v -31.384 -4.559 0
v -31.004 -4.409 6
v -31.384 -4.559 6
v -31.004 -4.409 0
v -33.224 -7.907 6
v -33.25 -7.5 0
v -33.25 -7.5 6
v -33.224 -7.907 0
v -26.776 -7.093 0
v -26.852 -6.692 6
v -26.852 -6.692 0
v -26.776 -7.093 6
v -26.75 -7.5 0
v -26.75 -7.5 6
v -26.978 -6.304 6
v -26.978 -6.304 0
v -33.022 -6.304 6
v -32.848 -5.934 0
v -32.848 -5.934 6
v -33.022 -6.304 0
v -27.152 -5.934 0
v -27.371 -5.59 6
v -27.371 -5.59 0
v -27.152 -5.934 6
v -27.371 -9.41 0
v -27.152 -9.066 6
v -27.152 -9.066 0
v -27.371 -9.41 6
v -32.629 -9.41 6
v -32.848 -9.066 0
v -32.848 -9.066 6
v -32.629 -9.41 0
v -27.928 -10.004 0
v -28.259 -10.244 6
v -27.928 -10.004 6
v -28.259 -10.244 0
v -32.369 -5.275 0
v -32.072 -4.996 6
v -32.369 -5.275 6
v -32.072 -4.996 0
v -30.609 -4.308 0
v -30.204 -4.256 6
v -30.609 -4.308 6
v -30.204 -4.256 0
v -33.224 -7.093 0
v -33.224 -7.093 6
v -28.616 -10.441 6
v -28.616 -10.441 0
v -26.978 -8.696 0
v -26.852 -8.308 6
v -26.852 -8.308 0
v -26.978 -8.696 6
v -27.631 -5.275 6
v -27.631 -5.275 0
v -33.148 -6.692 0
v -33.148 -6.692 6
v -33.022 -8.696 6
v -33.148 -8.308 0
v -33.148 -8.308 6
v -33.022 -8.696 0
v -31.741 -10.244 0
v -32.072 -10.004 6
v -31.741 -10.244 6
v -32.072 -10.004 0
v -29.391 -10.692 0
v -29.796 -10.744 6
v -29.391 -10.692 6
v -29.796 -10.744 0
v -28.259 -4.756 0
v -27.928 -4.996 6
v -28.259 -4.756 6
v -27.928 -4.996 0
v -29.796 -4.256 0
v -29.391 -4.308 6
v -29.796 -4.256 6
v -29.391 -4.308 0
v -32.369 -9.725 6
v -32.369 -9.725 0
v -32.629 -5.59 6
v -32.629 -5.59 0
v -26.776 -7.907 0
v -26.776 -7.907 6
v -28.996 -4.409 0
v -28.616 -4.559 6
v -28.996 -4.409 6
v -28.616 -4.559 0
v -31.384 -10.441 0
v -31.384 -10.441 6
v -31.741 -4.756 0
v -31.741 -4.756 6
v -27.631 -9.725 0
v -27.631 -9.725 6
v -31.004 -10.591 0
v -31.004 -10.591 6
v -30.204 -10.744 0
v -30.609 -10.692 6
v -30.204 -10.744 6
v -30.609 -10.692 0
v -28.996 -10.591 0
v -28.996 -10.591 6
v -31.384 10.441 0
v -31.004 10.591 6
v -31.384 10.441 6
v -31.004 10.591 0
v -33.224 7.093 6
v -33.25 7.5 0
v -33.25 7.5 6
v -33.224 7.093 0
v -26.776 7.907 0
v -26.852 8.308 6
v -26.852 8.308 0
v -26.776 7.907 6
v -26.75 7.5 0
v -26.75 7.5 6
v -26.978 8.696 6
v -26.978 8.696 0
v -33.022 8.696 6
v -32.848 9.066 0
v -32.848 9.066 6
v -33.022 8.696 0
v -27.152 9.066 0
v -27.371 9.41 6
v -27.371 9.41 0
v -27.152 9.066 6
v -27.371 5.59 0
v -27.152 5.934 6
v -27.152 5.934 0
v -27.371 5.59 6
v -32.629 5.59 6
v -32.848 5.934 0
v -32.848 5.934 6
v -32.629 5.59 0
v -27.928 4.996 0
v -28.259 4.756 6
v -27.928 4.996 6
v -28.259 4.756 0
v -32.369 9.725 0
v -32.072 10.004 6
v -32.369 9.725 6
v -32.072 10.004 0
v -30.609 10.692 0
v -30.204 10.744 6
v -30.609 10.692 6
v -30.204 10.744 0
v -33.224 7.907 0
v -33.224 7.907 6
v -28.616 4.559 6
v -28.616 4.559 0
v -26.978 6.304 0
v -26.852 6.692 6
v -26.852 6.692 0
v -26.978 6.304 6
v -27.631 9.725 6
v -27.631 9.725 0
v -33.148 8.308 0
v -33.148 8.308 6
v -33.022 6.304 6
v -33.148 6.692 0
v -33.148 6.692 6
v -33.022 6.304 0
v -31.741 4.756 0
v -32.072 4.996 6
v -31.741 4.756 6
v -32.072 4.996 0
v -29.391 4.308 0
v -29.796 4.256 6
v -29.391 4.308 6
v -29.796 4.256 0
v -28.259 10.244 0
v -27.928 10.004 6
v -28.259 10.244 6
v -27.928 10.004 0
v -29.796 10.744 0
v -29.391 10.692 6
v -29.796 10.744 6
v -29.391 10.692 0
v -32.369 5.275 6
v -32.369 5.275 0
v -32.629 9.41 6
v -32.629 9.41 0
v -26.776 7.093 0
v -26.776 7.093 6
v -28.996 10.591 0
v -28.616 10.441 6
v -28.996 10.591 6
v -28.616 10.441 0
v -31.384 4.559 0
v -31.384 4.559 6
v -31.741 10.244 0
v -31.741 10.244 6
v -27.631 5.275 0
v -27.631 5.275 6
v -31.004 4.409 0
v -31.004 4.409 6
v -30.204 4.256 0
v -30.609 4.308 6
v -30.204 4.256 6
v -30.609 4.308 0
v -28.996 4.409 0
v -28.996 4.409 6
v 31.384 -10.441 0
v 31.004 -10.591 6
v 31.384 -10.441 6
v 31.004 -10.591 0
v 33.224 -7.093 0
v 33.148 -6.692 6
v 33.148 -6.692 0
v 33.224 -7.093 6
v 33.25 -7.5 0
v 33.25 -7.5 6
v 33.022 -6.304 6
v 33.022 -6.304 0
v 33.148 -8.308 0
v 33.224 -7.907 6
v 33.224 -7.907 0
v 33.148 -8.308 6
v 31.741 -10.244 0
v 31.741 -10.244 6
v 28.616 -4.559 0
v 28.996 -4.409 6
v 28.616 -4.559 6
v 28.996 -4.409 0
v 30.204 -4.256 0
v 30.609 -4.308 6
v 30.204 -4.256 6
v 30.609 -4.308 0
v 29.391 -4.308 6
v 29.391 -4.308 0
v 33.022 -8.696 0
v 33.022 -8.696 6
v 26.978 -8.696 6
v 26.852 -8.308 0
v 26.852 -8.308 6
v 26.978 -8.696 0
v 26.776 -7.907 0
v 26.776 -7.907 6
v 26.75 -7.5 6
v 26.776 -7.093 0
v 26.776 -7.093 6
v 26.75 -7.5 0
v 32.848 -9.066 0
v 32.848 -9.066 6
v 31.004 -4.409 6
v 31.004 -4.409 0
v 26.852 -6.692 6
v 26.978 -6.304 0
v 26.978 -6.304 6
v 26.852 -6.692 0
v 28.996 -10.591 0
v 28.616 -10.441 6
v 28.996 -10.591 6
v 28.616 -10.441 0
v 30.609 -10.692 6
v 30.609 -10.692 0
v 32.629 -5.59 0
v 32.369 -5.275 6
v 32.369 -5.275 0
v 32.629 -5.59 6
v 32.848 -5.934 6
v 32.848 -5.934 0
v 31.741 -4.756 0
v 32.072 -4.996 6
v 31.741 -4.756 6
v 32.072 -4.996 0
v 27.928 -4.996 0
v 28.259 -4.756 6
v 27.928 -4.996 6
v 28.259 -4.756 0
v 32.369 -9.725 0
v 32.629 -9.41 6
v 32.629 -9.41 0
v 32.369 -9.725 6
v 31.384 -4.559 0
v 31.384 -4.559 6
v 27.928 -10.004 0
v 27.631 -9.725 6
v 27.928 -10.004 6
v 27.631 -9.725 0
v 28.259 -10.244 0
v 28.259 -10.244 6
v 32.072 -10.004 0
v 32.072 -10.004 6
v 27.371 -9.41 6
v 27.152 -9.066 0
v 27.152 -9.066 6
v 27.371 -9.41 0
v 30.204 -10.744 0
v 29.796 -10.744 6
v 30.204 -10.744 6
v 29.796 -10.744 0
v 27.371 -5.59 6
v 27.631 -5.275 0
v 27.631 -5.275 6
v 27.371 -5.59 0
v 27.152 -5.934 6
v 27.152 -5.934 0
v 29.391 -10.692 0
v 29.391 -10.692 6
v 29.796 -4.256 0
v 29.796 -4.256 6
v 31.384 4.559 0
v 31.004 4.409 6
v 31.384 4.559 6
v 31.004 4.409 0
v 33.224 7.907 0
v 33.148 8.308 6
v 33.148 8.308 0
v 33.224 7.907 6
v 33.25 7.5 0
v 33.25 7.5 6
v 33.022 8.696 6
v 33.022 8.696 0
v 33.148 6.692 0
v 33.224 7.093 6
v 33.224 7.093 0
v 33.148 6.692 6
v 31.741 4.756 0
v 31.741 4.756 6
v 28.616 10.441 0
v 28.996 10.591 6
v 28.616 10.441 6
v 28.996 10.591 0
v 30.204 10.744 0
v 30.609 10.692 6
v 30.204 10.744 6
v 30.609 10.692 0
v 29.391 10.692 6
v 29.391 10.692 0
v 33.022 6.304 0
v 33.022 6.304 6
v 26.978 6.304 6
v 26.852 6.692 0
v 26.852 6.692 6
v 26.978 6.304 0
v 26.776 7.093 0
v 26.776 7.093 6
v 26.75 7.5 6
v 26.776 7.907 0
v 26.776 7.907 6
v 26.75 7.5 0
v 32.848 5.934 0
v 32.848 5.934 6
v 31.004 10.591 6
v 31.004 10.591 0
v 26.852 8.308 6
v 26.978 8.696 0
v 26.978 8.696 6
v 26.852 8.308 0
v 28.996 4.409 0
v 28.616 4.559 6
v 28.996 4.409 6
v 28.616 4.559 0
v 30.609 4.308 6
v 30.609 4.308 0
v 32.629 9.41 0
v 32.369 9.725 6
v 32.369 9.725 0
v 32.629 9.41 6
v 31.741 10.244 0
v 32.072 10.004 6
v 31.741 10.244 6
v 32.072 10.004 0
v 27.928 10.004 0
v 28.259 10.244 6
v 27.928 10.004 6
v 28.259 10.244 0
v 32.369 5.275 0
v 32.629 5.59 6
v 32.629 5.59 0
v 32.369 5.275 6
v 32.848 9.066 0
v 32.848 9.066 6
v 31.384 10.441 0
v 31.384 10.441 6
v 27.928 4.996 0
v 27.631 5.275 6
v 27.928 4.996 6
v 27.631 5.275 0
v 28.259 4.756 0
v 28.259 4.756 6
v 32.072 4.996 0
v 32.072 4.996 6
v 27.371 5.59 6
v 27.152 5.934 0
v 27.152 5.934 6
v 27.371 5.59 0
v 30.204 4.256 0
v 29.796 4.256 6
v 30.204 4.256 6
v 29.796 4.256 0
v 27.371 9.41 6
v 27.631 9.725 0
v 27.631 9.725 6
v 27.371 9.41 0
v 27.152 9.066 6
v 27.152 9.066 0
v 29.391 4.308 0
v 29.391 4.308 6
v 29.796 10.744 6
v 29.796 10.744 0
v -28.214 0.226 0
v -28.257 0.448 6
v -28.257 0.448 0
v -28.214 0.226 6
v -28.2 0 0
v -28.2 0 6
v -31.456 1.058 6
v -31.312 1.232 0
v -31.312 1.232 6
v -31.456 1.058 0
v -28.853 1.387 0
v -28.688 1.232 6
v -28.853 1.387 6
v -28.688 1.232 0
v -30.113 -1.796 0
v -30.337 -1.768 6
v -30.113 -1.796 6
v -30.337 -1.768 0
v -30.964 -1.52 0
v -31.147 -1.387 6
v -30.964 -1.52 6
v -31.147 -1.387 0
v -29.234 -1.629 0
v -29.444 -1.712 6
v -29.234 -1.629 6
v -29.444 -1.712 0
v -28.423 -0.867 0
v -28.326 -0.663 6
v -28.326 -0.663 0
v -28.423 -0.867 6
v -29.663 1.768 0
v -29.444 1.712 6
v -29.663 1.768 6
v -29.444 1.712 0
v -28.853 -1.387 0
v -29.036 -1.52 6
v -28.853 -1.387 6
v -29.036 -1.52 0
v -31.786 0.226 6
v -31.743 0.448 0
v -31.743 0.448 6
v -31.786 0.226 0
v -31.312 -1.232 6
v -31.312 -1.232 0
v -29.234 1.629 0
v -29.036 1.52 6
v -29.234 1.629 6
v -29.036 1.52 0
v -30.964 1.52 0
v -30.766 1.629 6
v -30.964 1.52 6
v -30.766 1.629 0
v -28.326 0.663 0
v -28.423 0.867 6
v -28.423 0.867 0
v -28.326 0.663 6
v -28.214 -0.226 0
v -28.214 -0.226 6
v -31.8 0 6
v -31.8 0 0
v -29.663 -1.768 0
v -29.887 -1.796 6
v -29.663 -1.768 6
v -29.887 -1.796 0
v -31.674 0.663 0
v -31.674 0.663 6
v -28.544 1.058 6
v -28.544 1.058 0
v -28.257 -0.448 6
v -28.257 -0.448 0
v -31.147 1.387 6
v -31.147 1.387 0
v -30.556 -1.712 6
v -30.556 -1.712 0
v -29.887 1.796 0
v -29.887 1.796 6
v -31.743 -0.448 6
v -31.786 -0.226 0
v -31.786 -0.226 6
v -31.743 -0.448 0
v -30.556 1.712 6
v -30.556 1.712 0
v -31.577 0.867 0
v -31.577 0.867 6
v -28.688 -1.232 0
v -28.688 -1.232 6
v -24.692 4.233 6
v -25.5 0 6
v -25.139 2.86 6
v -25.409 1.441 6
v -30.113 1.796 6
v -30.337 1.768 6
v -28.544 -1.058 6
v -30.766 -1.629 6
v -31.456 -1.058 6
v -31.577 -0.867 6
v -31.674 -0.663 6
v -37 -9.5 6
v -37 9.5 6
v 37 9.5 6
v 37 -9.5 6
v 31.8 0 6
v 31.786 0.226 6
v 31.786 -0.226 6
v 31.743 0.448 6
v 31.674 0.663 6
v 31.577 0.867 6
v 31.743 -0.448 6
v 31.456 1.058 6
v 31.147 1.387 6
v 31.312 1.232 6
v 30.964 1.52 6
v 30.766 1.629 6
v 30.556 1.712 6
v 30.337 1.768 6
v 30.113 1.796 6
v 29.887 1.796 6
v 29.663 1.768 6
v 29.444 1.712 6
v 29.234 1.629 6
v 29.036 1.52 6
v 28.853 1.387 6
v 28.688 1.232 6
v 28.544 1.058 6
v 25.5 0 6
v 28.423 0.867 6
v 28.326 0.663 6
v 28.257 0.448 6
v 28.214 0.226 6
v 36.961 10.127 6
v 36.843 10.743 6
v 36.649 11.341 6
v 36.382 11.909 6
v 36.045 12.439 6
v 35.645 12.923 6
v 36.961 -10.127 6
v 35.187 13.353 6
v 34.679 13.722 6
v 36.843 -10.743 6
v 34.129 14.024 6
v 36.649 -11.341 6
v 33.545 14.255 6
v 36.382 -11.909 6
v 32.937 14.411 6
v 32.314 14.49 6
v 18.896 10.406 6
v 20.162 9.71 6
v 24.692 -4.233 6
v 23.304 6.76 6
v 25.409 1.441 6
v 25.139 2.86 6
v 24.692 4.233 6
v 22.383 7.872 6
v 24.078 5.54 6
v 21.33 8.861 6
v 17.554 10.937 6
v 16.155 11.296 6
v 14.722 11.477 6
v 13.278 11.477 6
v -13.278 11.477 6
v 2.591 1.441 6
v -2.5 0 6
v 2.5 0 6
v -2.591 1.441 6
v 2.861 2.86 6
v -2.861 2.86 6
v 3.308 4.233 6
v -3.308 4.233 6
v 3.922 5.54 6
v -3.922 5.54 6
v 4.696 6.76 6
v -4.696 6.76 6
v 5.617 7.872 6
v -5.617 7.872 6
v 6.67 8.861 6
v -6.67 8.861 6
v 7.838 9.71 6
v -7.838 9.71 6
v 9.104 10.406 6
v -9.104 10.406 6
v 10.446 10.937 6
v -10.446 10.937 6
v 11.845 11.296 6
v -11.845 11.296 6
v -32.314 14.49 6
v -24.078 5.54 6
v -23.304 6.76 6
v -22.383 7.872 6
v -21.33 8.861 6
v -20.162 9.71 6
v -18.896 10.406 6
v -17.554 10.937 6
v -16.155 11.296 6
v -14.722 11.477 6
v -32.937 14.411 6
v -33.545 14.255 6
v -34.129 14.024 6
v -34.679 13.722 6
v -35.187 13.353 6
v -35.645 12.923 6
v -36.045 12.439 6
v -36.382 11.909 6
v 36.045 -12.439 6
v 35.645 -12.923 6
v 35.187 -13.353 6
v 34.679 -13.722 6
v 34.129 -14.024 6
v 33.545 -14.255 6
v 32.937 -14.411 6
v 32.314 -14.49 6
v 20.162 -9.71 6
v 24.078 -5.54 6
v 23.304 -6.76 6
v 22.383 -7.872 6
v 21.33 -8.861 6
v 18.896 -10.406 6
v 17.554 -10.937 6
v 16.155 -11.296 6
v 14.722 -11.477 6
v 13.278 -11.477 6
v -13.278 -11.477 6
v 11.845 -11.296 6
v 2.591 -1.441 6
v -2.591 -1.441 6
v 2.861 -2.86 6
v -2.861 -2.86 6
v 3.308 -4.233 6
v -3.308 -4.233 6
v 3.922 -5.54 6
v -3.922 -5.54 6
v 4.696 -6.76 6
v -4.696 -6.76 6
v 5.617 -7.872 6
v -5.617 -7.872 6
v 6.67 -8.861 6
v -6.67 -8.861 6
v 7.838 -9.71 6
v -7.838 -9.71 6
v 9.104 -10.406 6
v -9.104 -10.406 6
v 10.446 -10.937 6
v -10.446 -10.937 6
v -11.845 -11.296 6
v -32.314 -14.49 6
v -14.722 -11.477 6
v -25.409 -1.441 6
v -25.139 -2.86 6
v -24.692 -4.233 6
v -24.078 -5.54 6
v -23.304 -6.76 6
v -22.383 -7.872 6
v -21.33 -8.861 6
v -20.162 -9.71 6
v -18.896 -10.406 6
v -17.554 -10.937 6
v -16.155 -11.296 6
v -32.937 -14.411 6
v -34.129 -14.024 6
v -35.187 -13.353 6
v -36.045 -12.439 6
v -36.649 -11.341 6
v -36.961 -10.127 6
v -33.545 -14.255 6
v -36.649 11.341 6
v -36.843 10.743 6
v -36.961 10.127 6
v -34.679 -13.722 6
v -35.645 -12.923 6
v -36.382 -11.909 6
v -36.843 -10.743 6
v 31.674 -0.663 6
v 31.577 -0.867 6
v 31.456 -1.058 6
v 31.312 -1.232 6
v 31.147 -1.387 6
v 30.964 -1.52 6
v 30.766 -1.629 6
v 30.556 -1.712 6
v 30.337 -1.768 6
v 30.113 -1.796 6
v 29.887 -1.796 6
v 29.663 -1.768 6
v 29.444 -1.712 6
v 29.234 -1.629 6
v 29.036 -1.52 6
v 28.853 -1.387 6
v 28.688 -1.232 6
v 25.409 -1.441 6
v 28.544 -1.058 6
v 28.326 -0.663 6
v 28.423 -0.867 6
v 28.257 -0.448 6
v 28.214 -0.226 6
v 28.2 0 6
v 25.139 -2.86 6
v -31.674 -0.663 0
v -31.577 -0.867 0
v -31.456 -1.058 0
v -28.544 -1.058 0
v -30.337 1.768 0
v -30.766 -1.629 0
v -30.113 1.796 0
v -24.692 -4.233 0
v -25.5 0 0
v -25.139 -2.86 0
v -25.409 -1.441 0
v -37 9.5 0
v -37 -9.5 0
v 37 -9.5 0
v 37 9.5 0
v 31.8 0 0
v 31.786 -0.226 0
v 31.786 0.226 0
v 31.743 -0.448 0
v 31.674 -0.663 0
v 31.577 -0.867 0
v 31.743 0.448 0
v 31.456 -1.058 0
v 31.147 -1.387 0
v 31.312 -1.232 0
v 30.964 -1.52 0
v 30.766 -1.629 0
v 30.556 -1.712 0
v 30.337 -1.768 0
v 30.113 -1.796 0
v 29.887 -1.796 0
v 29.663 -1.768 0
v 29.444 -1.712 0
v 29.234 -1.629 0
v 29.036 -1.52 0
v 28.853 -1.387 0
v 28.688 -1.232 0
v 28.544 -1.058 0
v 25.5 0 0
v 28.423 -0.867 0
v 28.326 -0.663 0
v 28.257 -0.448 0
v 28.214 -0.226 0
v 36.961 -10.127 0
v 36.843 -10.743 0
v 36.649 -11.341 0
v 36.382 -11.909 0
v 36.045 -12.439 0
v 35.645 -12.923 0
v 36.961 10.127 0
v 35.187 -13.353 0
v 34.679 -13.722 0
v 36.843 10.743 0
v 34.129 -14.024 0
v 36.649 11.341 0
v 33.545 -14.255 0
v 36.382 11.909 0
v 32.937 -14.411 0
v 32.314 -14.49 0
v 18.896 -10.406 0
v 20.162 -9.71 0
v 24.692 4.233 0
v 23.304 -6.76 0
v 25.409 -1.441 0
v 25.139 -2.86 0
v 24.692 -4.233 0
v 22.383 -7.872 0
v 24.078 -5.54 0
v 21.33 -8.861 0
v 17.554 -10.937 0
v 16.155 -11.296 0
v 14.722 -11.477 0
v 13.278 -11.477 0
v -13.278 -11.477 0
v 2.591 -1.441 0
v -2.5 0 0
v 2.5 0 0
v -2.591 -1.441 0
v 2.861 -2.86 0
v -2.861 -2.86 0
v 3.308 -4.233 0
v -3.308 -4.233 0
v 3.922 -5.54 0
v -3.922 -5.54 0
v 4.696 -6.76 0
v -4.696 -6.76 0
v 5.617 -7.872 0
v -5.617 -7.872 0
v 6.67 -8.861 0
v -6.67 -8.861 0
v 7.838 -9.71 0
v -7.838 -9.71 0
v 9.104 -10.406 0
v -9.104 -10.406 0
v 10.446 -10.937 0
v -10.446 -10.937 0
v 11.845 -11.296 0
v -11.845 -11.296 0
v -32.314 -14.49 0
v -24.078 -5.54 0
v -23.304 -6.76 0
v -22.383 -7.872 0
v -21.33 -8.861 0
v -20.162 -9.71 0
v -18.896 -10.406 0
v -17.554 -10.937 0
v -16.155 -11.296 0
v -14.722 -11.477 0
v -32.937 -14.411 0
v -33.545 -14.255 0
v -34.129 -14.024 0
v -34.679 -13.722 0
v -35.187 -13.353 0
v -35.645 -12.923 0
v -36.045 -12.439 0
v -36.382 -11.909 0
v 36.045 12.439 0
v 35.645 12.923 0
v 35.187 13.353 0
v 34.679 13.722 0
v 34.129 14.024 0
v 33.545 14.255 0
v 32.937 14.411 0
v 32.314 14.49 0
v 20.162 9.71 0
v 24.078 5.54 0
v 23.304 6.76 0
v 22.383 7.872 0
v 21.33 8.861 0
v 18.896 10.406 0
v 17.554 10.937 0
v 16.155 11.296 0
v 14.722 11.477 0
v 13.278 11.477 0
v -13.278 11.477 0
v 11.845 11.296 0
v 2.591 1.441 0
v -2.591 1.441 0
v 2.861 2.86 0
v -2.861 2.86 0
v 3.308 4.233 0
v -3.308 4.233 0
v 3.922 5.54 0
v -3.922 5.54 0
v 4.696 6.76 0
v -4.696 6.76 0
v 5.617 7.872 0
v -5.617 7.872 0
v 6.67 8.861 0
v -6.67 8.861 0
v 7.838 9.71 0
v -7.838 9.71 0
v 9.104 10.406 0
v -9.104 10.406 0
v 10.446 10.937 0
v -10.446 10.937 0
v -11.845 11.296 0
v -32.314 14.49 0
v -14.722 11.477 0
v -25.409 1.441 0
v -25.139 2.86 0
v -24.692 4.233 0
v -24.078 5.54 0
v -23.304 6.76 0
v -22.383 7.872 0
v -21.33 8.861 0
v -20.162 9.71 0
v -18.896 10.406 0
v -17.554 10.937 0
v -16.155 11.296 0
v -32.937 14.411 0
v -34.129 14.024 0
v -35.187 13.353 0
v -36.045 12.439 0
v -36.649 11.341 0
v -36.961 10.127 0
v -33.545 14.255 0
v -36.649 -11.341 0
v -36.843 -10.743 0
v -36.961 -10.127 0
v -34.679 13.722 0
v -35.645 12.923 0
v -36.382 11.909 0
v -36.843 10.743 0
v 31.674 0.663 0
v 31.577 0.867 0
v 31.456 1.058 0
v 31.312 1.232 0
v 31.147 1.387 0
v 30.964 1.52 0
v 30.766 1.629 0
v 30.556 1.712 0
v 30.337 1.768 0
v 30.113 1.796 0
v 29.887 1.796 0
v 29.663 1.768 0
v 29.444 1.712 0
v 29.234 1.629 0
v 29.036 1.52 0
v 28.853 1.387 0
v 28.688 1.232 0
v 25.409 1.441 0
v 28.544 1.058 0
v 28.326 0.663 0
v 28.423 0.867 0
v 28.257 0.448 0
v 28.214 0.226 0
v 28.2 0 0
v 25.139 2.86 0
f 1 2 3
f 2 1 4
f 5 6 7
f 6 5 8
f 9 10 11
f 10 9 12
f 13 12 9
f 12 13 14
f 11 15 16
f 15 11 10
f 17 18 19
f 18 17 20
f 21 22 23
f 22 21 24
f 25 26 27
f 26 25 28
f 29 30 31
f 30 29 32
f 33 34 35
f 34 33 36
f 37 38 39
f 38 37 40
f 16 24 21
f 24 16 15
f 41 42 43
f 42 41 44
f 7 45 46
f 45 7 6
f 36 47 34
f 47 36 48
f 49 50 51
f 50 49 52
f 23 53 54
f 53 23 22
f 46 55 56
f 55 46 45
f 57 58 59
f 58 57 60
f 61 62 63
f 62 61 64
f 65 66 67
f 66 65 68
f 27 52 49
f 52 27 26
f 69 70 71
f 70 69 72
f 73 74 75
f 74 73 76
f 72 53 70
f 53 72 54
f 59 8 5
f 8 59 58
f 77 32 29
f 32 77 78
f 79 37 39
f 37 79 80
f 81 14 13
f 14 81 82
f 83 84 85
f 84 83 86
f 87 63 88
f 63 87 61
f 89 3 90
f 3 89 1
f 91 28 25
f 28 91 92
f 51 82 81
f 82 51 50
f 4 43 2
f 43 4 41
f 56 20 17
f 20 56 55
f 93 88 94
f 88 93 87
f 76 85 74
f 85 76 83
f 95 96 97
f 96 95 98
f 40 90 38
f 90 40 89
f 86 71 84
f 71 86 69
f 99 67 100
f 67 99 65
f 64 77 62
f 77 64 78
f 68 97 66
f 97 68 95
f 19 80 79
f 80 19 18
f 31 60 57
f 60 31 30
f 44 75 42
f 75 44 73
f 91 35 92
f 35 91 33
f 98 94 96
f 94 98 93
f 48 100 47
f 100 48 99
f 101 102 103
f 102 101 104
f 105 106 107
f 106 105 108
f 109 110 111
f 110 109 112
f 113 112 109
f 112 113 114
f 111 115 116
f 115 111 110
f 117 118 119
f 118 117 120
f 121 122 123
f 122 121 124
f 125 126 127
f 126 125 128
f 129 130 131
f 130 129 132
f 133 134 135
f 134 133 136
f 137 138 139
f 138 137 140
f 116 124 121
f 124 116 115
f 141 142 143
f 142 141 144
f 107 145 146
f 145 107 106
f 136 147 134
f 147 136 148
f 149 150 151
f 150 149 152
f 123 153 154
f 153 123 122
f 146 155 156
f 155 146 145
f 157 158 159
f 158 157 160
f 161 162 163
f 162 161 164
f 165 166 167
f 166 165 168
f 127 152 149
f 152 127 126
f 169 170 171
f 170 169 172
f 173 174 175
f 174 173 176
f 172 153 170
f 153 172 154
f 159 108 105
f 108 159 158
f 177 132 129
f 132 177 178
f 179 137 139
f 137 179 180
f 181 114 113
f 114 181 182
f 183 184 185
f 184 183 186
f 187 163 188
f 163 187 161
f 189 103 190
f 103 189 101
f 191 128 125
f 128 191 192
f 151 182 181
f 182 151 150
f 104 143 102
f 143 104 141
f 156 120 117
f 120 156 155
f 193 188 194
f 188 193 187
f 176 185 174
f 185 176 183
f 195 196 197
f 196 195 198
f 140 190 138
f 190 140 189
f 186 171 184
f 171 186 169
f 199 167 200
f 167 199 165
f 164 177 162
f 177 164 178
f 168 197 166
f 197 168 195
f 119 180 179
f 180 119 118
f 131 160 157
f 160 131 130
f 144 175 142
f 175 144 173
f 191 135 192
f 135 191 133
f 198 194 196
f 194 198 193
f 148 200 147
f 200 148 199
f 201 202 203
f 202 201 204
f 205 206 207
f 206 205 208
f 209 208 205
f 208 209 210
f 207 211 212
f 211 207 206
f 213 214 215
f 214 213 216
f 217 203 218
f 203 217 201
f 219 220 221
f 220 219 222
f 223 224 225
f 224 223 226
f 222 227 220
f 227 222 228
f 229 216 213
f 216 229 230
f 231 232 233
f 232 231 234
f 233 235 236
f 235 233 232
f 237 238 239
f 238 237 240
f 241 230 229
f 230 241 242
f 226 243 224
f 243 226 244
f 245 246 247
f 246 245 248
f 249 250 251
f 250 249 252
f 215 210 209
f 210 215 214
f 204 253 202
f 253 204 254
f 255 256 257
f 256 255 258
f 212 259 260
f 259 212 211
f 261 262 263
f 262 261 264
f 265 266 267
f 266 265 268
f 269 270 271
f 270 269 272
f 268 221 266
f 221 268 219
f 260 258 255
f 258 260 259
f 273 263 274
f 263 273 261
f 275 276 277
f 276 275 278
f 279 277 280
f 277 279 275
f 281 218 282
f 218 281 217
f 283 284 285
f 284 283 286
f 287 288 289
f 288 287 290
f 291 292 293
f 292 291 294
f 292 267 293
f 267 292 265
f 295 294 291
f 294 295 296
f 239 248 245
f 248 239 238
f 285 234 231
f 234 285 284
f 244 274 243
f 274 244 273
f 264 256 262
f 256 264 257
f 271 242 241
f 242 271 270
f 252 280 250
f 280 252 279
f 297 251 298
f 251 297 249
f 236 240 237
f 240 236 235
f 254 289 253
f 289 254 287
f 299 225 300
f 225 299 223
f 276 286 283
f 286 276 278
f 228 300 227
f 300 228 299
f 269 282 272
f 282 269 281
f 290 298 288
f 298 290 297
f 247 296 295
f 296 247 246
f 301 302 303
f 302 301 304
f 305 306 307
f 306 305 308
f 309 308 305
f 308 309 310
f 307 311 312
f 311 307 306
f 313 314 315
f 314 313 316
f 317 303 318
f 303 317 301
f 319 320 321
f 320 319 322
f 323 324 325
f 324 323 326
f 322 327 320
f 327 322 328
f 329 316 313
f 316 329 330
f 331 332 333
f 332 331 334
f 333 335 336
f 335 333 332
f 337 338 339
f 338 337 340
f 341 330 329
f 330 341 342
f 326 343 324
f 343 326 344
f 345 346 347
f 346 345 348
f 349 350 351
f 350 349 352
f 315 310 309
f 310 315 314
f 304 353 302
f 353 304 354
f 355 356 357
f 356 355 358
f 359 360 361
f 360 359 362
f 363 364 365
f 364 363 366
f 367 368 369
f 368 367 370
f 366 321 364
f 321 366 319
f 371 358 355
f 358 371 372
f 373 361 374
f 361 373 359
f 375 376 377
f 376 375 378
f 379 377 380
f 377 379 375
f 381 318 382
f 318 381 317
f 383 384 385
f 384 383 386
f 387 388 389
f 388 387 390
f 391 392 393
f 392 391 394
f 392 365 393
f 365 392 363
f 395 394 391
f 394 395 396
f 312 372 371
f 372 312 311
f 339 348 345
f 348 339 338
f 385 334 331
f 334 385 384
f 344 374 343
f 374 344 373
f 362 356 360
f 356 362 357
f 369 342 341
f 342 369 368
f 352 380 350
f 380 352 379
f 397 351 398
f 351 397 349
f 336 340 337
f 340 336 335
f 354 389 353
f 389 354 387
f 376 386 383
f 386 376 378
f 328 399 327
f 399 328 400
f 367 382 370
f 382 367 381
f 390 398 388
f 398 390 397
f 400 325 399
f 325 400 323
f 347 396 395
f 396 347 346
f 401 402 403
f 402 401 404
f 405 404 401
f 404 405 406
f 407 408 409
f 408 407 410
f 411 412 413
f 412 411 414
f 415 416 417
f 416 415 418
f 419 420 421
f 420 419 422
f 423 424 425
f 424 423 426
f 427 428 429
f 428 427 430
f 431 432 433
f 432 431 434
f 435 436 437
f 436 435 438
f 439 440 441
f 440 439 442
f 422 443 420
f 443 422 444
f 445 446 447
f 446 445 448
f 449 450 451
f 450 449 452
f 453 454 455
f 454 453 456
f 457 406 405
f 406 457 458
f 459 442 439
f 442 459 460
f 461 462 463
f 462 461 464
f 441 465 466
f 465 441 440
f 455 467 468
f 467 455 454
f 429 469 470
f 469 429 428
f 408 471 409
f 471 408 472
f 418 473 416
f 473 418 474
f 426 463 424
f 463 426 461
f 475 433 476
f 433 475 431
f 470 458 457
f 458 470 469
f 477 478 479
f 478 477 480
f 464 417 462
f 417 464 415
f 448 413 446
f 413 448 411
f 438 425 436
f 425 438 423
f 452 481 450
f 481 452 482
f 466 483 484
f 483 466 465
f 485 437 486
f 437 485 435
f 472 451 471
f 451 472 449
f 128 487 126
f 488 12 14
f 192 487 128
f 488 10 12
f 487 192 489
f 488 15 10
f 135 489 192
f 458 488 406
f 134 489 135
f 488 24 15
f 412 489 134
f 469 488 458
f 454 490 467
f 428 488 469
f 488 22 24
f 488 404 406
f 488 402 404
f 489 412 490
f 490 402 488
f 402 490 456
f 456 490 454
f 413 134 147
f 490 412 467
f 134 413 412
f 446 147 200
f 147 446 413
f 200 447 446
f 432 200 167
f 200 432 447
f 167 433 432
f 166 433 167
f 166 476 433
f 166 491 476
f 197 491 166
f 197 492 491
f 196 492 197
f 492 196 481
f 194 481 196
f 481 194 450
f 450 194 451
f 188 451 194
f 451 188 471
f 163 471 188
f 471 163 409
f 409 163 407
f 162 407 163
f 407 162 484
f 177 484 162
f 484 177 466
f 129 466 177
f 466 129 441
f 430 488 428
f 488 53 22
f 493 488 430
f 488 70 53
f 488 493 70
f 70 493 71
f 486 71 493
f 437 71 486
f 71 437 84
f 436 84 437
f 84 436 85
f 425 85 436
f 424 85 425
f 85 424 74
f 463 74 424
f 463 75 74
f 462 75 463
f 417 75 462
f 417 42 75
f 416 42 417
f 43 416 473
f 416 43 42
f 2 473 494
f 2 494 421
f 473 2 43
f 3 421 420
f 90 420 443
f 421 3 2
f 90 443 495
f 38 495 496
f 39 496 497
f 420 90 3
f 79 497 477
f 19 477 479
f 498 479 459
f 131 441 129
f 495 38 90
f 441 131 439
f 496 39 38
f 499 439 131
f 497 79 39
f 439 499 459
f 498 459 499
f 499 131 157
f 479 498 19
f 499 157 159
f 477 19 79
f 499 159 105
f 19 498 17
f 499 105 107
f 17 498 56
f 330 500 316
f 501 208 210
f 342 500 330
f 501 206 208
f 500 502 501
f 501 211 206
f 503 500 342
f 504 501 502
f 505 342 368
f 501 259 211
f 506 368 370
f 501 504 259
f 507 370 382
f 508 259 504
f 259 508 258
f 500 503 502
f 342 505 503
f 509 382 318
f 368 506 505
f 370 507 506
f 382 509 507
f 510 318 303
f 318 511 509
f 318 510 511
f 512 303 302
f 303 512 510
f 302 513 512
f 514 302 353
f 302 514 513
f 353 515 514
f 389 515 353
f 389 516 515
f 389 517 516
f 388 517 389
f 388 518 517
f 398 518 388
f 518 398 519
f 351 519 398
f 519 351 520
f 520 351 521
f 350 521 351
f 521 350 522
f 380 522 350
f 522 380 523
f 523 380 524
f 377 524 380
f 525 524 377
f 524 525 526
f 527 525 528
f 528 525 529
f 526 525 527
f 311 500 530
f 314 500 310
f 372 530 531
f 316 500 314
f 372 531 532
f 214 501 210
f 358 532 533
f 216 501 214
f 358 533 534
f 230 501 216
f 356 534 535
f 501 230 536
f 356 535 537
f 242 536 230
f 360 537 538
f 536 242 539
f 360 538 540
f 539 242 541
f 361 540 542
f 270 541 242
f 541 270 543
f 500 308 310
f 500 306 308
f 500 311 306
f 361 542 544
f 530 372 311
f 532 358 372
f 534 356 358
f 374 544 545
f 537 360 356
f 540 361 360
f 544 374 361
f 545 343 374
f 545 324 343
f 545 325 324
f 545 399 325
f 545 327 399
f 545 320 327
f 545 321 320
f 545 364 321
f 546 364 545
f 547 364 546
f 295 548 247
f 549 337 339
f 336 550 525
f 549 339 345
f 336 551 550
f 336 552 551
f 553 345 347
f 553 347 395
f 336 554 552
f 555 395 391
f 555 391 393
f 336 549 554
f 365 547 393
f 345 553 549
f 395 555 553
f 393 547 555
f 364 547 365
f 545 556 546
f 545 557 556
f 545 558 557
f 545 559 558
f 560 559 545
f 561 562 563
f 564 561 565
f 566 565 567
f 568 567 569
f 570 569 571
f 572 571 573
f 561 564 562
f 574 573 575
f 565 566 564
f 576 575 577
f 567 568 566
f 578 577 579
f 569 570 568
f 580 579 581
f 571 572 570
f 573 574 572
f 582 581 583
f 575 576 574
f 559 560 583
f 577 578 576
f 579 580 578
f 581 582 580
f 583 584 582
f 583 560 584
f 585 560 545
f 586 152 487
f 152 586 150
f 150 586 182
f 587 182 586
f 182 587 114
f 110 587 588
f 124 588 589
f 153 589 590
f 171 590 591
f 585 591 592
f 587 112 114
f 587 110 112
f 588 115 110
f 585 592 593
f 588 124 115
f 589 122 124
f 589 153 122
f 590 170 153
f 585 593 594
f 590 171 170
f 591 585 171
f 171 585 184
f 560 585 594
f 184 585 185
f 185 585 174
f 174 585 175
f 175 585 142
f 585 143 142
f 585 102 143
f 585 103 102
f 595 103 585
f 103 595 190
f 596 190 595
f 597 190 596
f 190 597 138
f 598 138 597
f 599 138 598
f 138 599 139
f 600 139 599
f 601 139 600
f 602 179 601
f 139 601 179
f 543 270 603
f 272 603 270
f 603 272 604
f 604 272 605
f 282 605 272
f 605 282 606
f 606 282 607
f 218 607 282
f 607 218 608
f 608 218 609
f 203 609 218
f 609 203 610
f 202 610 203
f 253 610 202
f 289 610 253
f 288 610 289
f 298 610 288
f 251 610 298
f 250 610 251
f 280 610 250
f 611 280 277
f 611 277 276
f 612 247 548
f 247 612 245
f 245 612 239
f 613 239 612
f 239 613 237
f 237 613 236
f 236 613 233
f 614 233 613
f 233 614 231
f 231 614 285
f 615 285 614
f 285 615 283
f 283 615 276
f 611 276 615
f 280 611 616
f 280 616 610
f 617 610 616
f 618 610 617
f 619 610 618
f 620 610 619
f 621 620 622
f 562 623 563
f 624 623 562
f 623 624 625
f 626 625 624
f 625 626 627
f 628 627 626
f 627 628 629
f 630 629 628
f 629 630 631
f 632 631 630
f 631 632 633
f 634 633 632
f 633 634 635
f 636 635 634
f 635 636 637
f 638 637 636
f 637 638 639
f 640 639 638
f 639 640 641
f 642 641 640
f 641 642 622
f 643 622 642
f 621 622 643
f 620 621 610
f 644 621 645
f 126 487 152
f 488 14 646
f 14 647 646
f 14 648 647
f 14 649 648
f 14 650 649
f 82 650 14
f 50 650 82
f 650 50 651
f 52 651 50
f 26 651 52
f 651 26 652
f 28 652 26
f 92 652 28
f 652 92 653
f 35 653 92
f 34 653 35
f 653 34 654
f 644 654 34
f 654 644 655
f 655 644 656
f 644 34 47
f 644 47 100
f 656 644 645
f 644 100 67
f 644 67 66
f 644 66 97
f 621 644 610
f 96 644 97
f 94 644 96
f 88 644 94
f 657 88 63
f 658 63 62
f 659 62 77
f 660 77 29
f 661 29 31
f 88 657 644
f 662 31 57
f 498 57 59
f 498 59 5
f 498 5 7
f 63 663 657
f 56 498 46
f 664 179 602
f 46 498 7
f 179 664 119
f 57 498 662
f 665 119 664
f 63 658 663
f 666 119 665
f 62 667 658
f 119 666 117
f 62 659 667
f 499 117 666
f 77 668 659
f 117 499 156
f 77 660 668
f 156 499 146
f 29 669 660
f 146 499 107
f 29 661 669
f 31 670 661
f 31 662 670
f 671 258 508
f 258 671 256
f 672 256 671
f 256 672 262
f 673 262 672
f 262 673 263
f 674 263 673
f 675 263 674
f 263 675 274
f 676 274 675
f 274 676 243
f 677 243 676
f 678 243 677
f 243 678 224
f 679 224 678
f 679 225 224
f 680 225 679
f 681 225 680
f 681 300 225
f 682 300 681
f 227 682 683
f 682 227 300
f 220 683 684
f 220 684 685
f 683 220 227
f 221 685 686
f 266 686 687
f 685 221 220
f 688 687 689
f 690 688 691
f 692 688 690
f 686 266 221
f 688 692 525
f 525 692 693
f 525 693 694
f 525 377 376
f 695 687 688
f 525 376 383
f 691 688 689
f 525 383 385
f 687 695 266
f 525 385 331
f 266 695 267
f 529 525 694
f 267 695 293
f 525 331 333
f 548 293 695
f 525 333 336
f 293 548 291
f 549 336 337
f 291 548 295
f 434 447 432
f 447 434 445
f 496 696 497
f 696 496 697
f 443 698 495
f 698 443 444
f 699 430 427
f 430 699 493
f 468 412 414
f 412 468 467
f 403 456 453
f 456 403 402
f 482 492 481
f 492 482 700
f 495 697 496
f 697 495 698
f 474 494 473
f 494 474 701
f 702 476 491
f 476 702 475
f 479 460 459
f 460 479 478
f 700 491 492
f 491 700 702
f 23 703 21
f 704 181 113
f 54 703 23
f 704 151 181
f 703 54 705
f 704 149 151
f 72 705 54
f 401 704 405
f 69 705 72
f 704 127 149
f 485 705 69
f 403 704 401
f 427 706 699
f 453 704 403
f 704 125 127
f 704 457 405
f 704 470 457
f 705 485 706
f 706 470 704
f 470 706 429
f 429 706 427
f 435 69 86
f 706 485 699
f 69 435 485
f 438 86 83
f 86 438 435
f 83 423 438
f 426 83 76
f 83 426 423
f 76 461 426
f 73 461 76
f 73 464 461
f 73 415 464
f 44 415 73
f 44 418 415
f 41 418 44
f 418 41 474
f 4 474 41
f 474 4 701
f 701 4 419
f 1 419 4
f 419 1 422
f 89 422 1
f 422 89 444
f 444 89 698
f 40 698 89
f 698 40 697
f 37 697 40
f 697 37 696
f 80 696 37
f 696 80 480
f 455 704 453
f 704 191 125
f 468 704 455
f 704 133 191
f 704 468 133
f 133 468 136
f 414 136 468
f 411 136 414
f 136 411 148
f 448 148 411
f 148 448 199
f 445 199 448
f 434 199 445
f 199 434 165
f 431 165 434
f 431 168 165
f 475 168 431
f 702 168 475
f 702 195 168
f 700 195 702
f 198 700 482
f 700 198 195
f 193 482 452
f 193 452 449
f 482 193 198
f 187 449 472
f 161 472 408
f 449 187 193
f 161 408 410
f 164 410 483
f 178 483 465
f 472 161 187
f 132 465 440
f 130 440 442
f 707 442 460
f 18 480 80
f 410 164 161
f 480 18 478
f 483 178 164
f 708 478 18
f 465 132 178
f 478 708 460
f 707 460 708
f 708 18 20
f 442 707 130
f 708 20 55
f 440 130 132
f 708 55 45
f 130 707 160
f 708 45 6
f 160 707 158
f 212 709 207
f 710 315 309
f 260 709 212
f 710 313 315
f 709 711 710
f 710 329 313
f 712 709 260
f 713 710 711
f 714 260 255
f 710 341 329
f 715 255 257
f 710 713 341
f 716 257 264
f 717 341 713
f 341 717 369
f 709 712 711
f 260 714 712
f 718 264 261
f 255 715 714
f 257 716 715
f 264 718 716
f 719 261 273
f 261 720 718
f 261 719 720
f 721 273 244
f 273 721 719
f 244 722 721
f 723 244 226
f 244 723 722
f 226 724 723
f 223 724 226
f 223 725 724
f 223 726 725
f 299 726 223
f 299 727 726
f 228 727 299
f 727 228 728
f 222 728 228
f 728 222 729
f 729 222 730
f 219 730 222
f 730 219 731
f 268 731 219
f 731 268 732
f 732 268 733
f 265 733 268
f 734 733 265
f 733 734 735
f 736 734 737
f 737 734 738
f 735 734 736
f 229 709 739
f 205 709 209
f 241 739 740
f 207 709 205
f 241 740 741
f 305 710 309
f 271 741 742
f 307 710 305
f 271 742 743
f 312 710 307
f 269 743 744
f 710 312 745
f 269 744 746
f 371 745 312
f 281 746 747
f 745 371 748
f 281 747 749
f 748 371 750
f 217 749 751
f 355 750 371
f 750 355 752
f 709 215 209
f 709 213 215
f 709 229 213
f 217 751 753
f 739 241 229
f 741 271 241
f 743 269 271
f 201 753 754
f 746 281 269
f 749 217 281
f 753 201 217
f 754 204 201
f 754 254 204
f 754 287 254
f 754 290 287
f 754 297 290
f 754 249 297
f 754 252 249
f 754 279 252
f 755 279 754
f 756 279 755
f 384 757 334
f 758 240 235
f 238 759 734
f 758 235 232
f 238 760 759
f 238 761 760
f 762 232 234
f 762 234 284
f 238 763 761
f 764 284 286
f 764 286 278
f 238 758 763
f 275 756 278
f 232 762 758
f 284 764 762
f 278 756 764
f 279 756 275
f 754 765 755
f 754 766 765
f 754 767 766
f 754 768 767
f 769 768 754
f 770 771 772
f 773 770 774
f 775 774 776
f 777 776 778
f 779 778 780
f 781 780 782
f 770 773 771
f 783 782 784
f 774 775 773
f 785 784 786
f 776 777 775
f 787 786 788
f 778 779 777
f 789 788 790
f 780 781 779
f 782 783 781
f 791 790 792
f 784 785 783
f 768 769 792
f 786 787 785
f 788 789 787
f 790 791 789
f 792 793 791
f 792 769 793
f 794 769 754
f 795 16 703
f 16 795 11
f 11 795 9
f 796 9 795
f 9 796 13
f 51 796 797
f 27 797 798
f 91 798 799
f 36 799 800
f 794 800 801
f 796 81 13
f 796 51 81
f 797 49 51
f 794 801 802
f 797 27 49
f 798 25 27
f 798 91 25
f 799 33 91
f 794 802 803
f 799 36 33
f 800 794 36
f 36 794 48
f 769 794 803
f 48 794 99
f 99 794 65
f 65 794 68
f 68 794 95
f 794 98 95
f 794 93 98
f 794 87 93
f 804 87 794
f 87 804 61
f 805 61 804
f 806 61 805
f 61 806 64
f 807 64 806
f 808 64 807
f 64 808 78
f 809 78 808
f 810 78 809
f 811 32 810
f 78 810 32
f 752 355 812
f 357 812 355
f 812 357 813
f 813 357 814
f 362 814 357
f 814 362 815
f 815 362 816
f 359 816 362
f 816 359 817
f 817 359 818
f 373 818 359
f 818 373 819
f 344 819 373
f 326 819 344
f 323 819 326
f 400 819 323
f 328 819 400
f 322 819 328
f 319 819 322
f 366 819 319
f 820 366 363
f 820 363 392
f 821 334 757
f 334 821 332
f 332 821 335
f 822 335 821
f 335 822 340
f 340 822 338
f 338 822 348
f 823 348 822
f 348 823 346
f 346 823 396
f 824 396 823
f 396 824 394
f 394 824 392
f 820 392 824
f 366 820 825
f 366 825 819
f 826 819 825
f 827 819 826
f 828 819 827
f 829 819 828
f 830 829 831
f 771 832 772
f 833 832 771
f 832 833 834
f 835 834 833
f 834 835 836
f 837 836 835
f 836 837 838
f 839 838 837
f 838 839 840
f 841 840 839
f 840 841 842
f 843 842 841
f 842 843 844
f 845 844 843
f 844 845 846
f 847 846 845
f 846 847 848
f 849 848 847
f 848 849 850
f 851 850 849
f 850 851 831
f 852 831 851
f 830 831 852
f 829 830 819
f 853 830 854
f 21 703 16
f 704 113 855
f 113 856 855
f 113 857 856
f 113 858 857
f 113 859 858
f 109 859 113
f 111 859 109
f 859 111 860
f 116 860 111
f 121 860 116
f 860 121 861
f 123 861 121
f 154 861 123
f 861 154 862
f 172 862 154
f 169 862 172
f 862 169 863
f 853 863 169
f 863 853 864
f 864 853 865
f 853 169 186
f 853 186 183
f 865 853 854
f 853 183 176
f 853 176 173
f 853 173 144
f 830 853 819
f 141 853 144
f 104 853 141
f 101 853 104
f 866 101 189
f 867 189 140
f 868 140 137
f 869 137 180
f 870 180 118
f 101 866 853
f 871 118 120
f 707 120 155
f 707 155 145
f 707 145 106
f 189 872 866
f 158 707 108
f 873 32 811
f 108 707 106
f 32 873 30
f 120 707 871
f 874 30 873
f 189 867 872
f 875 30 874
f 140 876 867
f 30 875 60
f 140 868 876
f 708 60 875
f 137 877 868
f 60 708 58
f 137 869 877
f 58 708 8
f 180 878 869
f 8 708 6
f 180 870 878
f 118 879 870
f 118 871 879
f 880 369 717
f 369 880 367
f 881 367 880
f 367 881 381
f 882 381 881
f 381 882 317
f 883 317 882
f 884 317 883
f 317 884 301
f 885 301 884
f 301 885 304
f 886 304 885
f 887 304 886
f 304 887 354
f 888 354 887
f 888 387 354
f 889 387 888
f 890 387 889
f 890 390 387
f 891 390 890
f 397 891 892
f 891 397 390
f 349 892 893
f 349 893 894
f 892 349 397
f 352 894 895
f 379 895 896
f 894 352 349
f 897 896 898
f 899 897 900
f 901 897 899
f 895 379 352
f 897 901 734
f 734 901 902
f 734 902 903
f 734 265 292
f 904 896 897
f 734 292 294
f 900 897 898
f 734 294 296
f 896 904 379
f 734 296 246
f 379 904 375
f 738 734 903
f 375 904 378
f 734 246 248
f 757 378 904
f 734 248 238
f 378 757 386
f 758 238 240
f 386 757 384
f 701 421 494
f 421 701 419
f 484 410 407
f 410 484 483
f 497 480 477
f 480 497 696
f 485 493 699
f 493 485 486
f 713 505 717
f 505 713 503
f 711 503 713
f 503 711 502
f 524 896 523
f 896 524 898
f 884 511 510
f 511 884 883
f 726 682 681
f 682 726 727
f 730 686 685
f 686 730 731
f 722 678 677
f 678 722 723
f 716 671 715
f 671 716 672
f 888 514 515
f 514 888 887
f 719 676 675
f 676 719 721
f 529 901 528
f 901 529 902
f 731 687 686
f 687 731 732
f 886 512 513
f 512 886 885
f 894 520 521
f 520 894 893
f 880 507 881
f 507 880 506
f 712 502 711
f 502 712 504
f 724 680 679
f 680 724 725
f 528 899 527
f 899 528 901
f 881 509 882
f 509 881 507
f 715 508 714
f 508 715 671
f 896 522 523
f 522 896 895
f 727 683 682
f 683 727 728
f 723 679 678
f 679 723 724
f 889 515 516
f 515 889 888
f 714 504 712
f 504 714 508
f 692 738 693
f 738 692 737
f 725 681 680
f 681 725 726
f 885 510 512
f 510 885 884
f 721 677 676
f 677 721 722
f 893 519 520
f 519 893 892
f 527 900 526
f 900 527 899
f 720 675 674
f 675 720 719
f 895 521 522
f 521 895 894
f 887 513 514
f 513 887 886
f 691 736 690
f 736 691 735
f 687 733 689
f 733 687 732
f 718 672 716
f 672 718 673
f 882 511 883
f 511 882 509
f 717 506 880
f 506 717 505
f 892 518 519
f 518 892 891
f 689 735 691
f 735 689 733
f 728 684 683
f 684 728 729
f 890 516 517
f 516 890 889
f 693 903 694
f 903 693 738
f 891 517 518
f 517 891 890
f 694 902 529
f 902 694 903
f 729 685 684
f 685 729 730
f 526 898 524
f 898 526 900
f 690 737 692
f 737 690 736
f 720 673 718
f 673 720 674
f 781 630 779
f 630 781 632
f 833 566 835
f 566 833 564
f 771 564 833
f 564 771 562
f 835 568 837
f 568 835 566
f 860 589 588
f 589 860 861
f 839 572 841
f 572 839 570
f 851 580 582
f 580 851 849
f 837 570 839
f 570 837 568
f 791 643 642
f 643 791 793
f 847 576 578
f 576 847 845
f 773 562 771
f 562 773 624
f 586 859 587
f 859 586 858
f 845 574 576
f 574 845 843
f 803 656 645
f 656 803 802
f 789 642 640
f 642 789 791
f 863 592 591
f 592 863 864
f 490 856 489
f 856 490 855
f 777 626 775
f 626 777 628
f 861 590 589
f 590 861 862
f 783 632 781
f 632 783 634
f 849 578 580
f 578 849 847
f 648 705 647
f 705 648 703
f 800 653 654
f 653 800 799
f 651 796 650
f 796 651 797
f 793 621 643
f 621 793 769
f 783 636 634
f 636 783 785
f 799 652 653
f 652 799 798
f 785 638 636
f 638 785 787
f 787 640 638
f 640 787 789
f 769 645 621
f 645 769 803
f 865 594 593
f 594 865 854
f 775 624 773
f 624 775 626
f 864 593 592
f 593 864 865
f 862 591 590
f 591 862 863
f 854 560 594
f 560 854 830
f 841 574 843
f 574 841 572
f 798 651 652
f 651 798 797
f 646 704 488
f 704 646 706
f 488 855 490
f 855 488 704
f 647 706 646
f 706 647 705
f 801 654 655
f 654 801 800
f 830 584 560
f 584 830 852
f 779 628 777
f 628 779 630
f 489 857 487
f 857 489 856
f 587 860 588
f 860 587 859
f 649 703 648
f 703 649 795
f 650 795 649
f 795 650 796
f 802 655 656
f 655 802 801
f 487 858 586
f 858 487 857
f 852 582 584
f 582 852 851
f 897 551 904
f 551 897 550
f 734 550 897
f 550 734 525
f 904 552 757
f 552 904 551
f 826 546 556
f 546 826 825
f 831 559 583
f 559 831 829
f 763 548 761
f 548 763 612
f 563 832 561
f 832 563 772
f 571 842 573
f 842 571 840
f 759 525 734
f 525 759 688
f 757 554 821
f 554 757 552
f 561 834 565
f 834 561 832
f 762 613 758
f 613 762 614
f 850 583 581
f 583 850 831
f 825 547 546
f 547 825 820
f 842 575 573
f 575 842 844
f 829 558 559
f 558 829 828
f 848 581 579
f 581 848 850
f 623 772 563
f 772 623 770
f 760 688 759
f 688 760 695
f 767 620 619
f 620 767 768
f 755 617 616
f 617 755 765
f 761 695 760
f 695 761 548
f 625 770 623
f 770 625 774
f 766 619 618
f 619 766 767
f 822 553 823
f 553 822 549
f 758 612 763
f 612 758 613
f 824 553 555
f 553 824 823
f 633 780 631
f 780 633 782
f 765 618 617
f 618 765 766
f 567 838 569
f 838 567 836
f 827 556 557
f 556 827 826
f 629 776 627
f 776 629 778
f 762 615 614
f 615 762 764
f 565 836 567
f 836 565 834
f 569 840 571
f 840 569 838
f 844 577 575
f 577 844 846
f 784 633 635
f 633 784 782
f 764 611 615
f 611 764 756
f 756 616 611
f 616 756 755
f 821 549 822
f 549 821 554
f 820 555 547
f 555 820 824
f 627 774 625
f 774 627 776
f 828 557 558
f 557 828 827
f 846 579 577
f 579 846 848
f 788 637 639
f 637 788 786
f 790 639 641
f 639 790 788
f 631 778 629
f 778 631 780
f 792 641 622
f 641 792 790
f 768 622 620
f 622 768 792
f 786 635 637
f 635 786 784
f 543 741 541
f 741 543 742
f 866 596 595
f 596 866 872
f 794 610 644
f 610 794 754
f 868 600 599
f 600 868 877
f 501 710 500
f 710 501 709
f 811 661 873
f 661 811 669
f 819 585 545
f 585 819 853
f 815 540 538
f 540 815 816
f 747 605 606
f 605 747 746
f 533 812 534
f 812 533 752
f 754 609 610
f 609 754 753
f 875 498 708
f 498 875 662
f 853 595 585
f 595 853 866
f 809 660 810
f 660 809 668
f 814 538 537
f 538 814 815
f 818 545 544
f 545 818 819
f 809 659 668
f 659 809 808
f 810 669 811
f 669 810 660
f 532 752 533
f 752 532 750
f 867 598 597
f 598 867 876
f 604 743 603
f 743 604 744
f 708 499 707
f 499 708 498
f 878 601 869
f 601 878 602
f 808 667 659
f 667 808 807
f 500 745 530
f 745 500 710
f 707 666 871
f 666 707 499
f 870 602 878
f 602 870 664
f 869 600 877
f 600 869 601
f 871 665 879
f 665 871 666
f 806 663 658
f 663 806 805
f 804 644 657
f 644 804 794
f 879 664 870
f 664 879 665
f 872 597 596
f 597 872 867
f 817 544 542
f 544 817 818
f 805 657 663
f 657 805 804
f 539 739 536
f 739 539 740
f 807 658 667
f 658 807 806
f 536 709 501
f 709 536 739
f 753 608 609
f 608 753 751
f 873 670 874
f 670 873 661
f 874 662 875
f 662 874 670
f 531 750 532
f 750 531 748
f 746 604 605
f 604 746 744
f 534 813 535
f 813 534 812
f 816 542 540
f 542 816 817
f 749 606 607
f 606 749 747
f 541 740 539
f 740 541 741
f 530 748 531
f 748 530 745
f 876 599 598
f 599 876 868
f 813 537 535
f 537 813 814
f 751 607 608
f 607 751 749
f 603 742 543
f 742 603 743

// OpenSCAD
$fn = 50;


difference() {
	union() {
		hull() {
			translate(v = [-32.0000000000, 9.5000000000, 0]) {
				cylinder(h = 6, r = 5);
			}
			translate(v = [32.0000000000, 9.5000000000, 0]) {
				cylinder(h = 6, r = 5);
			}
			translate(v = [-32.0000000000, -9.5000000000, 0]) {
				cylinder(h = 6, r = 5);
			}
			translate(v = [32.0000000000, -9.5000000000, 0]) {
				cylinder(h = 6, r = 5);
			}
		}
	}
	union() {
		#translate(v = [-30.0000000000, -7.5000000000, 0]) {
			cylinder(h = 6, r = 3.2500000000);
		}
		#translate(v = [-30.0000000000, 7.5000000000, 0]) {
			cylinder(h = 6, r = 3.2500000000);
		}
		#translate(v = [30.0000000000, -7.5000000000, 0]) {
			cylinder(h = 6, r = 3.2500000000);
		}
		#translate(v = [30.0000000000, 7.5000000000, 0]) {
			cylinder(h = 6, r = 3.2500000000);
		}
		#translate(v = [-30.0000000000, -7.5000000000, -100.0000000000]) {
			cylinder(h = 200, r = 3.2500000000);
		}
		#translate(v = [-30.0000000000, 7.5000000000, -100.0000000000]) {
			cylinder(h = 200, r = 3.2500000000);
		}
		#translate(v = [30.0000000000, -7.5000000000, -100.0000000000]) {
			cylinder(h = 200, r = 3.2500000000);
		}
		#translate(v = [30.0000000000, 7.5000000000, -100.0000000000]) {
			cylinder(h = 200, r = 3.2500000000);
		}
		#translate(v = [-30.0000000000, -7.5000000000, 0]) {
			cylinder(h = 6, r = 1.8000000000);
		}
		#translate(v = [-30.0000000000, 0.0000000000, 0]) {
			cylinder(h = 6, r = 1.8000000000);
		}
		#translate(v = [-30.0000000000, 7.5000000000, 0]) {
			cylinder(h = 6, r = 1.8000000000);
		}
		#translate(v = [30.0000000000, -7.5000000000, 0]) {
			cylinder(h = 6, r = 1.8000000000);
		}
		#translate(v = [30.0000000000, 0.0000000000, 0]) {
			cylinder(h = 6, r = 1.8000000000);
		}
		#translate(v = [30.0000000000, 7.5000000000, 0]) {
			cylinder(h = 6, r = 1.8000000000);
		}
		#translate(v = [-30.0000000000, -7.5000000000, 0]) {
			cylinder(h = 6, r = 1.8000000000);
		}
		#translate(v = [-30.0000000000, 0.0000000000, 0]) {
			cylinder(h = 6, r = 1.8000000000);
		}
		#translate(v = [-30.0000000000, 7.5000000000, 0]) {
			cylinder(h = 6, r = 1.8000000000);
		}
		#translate(v = [30.0000000000, -7.5000000000, 0]) {
			cylinder(h = 6, r = 1.8000000000);
		}
		#translate(v = [30.0000000000, 0.0000000000, 0]) {
			cylinder(h = 6, r = 1.8000000000);
		}
		#translate(v = [30.0000000000, 7.5000000000, 0]) {
			cylinder(h = 6, r = 1.8000000000);
		}
		#translate(v = [-30.0000000000, -7.5000000000, 0]) {
			cylinder(h = 6, r = 1.8000000000);
		}
		#translate(v = [-30.0000000000, 0.0000000000, 0]) {
			cylinder(h = 6, r = 1.8000000000);
		}
		#translate(v = [-30.0000000000, 7.5000000000, 0]) {
			cylinder(h = 6, r = 1.8000000000);
		}
		#translate(v = [30.0000000000, -7.5000000000, 0]) {
			cylinder(h = 6, r = 1.8000000000);
		}
		#translate(v = [30.0000000000, 0.0000000000, 0]) {
			cylinder(h = 6, r = 1.8000000000);
		}
		#translate(v = [30.0000000000, 7.5000000000, 0]) {
			cylinder(h = 6, r = 1.8000000000);
		}
		#translate(v = [-14.0000000000, 0, 0]) {
			cylinder(h = 6, r = 11.5000000000);
		}
		#translate(v = [14.0000000000, 0, 0]) {
			cylinder(h = 6, r = 11.5000000000);
		}
	}
}
